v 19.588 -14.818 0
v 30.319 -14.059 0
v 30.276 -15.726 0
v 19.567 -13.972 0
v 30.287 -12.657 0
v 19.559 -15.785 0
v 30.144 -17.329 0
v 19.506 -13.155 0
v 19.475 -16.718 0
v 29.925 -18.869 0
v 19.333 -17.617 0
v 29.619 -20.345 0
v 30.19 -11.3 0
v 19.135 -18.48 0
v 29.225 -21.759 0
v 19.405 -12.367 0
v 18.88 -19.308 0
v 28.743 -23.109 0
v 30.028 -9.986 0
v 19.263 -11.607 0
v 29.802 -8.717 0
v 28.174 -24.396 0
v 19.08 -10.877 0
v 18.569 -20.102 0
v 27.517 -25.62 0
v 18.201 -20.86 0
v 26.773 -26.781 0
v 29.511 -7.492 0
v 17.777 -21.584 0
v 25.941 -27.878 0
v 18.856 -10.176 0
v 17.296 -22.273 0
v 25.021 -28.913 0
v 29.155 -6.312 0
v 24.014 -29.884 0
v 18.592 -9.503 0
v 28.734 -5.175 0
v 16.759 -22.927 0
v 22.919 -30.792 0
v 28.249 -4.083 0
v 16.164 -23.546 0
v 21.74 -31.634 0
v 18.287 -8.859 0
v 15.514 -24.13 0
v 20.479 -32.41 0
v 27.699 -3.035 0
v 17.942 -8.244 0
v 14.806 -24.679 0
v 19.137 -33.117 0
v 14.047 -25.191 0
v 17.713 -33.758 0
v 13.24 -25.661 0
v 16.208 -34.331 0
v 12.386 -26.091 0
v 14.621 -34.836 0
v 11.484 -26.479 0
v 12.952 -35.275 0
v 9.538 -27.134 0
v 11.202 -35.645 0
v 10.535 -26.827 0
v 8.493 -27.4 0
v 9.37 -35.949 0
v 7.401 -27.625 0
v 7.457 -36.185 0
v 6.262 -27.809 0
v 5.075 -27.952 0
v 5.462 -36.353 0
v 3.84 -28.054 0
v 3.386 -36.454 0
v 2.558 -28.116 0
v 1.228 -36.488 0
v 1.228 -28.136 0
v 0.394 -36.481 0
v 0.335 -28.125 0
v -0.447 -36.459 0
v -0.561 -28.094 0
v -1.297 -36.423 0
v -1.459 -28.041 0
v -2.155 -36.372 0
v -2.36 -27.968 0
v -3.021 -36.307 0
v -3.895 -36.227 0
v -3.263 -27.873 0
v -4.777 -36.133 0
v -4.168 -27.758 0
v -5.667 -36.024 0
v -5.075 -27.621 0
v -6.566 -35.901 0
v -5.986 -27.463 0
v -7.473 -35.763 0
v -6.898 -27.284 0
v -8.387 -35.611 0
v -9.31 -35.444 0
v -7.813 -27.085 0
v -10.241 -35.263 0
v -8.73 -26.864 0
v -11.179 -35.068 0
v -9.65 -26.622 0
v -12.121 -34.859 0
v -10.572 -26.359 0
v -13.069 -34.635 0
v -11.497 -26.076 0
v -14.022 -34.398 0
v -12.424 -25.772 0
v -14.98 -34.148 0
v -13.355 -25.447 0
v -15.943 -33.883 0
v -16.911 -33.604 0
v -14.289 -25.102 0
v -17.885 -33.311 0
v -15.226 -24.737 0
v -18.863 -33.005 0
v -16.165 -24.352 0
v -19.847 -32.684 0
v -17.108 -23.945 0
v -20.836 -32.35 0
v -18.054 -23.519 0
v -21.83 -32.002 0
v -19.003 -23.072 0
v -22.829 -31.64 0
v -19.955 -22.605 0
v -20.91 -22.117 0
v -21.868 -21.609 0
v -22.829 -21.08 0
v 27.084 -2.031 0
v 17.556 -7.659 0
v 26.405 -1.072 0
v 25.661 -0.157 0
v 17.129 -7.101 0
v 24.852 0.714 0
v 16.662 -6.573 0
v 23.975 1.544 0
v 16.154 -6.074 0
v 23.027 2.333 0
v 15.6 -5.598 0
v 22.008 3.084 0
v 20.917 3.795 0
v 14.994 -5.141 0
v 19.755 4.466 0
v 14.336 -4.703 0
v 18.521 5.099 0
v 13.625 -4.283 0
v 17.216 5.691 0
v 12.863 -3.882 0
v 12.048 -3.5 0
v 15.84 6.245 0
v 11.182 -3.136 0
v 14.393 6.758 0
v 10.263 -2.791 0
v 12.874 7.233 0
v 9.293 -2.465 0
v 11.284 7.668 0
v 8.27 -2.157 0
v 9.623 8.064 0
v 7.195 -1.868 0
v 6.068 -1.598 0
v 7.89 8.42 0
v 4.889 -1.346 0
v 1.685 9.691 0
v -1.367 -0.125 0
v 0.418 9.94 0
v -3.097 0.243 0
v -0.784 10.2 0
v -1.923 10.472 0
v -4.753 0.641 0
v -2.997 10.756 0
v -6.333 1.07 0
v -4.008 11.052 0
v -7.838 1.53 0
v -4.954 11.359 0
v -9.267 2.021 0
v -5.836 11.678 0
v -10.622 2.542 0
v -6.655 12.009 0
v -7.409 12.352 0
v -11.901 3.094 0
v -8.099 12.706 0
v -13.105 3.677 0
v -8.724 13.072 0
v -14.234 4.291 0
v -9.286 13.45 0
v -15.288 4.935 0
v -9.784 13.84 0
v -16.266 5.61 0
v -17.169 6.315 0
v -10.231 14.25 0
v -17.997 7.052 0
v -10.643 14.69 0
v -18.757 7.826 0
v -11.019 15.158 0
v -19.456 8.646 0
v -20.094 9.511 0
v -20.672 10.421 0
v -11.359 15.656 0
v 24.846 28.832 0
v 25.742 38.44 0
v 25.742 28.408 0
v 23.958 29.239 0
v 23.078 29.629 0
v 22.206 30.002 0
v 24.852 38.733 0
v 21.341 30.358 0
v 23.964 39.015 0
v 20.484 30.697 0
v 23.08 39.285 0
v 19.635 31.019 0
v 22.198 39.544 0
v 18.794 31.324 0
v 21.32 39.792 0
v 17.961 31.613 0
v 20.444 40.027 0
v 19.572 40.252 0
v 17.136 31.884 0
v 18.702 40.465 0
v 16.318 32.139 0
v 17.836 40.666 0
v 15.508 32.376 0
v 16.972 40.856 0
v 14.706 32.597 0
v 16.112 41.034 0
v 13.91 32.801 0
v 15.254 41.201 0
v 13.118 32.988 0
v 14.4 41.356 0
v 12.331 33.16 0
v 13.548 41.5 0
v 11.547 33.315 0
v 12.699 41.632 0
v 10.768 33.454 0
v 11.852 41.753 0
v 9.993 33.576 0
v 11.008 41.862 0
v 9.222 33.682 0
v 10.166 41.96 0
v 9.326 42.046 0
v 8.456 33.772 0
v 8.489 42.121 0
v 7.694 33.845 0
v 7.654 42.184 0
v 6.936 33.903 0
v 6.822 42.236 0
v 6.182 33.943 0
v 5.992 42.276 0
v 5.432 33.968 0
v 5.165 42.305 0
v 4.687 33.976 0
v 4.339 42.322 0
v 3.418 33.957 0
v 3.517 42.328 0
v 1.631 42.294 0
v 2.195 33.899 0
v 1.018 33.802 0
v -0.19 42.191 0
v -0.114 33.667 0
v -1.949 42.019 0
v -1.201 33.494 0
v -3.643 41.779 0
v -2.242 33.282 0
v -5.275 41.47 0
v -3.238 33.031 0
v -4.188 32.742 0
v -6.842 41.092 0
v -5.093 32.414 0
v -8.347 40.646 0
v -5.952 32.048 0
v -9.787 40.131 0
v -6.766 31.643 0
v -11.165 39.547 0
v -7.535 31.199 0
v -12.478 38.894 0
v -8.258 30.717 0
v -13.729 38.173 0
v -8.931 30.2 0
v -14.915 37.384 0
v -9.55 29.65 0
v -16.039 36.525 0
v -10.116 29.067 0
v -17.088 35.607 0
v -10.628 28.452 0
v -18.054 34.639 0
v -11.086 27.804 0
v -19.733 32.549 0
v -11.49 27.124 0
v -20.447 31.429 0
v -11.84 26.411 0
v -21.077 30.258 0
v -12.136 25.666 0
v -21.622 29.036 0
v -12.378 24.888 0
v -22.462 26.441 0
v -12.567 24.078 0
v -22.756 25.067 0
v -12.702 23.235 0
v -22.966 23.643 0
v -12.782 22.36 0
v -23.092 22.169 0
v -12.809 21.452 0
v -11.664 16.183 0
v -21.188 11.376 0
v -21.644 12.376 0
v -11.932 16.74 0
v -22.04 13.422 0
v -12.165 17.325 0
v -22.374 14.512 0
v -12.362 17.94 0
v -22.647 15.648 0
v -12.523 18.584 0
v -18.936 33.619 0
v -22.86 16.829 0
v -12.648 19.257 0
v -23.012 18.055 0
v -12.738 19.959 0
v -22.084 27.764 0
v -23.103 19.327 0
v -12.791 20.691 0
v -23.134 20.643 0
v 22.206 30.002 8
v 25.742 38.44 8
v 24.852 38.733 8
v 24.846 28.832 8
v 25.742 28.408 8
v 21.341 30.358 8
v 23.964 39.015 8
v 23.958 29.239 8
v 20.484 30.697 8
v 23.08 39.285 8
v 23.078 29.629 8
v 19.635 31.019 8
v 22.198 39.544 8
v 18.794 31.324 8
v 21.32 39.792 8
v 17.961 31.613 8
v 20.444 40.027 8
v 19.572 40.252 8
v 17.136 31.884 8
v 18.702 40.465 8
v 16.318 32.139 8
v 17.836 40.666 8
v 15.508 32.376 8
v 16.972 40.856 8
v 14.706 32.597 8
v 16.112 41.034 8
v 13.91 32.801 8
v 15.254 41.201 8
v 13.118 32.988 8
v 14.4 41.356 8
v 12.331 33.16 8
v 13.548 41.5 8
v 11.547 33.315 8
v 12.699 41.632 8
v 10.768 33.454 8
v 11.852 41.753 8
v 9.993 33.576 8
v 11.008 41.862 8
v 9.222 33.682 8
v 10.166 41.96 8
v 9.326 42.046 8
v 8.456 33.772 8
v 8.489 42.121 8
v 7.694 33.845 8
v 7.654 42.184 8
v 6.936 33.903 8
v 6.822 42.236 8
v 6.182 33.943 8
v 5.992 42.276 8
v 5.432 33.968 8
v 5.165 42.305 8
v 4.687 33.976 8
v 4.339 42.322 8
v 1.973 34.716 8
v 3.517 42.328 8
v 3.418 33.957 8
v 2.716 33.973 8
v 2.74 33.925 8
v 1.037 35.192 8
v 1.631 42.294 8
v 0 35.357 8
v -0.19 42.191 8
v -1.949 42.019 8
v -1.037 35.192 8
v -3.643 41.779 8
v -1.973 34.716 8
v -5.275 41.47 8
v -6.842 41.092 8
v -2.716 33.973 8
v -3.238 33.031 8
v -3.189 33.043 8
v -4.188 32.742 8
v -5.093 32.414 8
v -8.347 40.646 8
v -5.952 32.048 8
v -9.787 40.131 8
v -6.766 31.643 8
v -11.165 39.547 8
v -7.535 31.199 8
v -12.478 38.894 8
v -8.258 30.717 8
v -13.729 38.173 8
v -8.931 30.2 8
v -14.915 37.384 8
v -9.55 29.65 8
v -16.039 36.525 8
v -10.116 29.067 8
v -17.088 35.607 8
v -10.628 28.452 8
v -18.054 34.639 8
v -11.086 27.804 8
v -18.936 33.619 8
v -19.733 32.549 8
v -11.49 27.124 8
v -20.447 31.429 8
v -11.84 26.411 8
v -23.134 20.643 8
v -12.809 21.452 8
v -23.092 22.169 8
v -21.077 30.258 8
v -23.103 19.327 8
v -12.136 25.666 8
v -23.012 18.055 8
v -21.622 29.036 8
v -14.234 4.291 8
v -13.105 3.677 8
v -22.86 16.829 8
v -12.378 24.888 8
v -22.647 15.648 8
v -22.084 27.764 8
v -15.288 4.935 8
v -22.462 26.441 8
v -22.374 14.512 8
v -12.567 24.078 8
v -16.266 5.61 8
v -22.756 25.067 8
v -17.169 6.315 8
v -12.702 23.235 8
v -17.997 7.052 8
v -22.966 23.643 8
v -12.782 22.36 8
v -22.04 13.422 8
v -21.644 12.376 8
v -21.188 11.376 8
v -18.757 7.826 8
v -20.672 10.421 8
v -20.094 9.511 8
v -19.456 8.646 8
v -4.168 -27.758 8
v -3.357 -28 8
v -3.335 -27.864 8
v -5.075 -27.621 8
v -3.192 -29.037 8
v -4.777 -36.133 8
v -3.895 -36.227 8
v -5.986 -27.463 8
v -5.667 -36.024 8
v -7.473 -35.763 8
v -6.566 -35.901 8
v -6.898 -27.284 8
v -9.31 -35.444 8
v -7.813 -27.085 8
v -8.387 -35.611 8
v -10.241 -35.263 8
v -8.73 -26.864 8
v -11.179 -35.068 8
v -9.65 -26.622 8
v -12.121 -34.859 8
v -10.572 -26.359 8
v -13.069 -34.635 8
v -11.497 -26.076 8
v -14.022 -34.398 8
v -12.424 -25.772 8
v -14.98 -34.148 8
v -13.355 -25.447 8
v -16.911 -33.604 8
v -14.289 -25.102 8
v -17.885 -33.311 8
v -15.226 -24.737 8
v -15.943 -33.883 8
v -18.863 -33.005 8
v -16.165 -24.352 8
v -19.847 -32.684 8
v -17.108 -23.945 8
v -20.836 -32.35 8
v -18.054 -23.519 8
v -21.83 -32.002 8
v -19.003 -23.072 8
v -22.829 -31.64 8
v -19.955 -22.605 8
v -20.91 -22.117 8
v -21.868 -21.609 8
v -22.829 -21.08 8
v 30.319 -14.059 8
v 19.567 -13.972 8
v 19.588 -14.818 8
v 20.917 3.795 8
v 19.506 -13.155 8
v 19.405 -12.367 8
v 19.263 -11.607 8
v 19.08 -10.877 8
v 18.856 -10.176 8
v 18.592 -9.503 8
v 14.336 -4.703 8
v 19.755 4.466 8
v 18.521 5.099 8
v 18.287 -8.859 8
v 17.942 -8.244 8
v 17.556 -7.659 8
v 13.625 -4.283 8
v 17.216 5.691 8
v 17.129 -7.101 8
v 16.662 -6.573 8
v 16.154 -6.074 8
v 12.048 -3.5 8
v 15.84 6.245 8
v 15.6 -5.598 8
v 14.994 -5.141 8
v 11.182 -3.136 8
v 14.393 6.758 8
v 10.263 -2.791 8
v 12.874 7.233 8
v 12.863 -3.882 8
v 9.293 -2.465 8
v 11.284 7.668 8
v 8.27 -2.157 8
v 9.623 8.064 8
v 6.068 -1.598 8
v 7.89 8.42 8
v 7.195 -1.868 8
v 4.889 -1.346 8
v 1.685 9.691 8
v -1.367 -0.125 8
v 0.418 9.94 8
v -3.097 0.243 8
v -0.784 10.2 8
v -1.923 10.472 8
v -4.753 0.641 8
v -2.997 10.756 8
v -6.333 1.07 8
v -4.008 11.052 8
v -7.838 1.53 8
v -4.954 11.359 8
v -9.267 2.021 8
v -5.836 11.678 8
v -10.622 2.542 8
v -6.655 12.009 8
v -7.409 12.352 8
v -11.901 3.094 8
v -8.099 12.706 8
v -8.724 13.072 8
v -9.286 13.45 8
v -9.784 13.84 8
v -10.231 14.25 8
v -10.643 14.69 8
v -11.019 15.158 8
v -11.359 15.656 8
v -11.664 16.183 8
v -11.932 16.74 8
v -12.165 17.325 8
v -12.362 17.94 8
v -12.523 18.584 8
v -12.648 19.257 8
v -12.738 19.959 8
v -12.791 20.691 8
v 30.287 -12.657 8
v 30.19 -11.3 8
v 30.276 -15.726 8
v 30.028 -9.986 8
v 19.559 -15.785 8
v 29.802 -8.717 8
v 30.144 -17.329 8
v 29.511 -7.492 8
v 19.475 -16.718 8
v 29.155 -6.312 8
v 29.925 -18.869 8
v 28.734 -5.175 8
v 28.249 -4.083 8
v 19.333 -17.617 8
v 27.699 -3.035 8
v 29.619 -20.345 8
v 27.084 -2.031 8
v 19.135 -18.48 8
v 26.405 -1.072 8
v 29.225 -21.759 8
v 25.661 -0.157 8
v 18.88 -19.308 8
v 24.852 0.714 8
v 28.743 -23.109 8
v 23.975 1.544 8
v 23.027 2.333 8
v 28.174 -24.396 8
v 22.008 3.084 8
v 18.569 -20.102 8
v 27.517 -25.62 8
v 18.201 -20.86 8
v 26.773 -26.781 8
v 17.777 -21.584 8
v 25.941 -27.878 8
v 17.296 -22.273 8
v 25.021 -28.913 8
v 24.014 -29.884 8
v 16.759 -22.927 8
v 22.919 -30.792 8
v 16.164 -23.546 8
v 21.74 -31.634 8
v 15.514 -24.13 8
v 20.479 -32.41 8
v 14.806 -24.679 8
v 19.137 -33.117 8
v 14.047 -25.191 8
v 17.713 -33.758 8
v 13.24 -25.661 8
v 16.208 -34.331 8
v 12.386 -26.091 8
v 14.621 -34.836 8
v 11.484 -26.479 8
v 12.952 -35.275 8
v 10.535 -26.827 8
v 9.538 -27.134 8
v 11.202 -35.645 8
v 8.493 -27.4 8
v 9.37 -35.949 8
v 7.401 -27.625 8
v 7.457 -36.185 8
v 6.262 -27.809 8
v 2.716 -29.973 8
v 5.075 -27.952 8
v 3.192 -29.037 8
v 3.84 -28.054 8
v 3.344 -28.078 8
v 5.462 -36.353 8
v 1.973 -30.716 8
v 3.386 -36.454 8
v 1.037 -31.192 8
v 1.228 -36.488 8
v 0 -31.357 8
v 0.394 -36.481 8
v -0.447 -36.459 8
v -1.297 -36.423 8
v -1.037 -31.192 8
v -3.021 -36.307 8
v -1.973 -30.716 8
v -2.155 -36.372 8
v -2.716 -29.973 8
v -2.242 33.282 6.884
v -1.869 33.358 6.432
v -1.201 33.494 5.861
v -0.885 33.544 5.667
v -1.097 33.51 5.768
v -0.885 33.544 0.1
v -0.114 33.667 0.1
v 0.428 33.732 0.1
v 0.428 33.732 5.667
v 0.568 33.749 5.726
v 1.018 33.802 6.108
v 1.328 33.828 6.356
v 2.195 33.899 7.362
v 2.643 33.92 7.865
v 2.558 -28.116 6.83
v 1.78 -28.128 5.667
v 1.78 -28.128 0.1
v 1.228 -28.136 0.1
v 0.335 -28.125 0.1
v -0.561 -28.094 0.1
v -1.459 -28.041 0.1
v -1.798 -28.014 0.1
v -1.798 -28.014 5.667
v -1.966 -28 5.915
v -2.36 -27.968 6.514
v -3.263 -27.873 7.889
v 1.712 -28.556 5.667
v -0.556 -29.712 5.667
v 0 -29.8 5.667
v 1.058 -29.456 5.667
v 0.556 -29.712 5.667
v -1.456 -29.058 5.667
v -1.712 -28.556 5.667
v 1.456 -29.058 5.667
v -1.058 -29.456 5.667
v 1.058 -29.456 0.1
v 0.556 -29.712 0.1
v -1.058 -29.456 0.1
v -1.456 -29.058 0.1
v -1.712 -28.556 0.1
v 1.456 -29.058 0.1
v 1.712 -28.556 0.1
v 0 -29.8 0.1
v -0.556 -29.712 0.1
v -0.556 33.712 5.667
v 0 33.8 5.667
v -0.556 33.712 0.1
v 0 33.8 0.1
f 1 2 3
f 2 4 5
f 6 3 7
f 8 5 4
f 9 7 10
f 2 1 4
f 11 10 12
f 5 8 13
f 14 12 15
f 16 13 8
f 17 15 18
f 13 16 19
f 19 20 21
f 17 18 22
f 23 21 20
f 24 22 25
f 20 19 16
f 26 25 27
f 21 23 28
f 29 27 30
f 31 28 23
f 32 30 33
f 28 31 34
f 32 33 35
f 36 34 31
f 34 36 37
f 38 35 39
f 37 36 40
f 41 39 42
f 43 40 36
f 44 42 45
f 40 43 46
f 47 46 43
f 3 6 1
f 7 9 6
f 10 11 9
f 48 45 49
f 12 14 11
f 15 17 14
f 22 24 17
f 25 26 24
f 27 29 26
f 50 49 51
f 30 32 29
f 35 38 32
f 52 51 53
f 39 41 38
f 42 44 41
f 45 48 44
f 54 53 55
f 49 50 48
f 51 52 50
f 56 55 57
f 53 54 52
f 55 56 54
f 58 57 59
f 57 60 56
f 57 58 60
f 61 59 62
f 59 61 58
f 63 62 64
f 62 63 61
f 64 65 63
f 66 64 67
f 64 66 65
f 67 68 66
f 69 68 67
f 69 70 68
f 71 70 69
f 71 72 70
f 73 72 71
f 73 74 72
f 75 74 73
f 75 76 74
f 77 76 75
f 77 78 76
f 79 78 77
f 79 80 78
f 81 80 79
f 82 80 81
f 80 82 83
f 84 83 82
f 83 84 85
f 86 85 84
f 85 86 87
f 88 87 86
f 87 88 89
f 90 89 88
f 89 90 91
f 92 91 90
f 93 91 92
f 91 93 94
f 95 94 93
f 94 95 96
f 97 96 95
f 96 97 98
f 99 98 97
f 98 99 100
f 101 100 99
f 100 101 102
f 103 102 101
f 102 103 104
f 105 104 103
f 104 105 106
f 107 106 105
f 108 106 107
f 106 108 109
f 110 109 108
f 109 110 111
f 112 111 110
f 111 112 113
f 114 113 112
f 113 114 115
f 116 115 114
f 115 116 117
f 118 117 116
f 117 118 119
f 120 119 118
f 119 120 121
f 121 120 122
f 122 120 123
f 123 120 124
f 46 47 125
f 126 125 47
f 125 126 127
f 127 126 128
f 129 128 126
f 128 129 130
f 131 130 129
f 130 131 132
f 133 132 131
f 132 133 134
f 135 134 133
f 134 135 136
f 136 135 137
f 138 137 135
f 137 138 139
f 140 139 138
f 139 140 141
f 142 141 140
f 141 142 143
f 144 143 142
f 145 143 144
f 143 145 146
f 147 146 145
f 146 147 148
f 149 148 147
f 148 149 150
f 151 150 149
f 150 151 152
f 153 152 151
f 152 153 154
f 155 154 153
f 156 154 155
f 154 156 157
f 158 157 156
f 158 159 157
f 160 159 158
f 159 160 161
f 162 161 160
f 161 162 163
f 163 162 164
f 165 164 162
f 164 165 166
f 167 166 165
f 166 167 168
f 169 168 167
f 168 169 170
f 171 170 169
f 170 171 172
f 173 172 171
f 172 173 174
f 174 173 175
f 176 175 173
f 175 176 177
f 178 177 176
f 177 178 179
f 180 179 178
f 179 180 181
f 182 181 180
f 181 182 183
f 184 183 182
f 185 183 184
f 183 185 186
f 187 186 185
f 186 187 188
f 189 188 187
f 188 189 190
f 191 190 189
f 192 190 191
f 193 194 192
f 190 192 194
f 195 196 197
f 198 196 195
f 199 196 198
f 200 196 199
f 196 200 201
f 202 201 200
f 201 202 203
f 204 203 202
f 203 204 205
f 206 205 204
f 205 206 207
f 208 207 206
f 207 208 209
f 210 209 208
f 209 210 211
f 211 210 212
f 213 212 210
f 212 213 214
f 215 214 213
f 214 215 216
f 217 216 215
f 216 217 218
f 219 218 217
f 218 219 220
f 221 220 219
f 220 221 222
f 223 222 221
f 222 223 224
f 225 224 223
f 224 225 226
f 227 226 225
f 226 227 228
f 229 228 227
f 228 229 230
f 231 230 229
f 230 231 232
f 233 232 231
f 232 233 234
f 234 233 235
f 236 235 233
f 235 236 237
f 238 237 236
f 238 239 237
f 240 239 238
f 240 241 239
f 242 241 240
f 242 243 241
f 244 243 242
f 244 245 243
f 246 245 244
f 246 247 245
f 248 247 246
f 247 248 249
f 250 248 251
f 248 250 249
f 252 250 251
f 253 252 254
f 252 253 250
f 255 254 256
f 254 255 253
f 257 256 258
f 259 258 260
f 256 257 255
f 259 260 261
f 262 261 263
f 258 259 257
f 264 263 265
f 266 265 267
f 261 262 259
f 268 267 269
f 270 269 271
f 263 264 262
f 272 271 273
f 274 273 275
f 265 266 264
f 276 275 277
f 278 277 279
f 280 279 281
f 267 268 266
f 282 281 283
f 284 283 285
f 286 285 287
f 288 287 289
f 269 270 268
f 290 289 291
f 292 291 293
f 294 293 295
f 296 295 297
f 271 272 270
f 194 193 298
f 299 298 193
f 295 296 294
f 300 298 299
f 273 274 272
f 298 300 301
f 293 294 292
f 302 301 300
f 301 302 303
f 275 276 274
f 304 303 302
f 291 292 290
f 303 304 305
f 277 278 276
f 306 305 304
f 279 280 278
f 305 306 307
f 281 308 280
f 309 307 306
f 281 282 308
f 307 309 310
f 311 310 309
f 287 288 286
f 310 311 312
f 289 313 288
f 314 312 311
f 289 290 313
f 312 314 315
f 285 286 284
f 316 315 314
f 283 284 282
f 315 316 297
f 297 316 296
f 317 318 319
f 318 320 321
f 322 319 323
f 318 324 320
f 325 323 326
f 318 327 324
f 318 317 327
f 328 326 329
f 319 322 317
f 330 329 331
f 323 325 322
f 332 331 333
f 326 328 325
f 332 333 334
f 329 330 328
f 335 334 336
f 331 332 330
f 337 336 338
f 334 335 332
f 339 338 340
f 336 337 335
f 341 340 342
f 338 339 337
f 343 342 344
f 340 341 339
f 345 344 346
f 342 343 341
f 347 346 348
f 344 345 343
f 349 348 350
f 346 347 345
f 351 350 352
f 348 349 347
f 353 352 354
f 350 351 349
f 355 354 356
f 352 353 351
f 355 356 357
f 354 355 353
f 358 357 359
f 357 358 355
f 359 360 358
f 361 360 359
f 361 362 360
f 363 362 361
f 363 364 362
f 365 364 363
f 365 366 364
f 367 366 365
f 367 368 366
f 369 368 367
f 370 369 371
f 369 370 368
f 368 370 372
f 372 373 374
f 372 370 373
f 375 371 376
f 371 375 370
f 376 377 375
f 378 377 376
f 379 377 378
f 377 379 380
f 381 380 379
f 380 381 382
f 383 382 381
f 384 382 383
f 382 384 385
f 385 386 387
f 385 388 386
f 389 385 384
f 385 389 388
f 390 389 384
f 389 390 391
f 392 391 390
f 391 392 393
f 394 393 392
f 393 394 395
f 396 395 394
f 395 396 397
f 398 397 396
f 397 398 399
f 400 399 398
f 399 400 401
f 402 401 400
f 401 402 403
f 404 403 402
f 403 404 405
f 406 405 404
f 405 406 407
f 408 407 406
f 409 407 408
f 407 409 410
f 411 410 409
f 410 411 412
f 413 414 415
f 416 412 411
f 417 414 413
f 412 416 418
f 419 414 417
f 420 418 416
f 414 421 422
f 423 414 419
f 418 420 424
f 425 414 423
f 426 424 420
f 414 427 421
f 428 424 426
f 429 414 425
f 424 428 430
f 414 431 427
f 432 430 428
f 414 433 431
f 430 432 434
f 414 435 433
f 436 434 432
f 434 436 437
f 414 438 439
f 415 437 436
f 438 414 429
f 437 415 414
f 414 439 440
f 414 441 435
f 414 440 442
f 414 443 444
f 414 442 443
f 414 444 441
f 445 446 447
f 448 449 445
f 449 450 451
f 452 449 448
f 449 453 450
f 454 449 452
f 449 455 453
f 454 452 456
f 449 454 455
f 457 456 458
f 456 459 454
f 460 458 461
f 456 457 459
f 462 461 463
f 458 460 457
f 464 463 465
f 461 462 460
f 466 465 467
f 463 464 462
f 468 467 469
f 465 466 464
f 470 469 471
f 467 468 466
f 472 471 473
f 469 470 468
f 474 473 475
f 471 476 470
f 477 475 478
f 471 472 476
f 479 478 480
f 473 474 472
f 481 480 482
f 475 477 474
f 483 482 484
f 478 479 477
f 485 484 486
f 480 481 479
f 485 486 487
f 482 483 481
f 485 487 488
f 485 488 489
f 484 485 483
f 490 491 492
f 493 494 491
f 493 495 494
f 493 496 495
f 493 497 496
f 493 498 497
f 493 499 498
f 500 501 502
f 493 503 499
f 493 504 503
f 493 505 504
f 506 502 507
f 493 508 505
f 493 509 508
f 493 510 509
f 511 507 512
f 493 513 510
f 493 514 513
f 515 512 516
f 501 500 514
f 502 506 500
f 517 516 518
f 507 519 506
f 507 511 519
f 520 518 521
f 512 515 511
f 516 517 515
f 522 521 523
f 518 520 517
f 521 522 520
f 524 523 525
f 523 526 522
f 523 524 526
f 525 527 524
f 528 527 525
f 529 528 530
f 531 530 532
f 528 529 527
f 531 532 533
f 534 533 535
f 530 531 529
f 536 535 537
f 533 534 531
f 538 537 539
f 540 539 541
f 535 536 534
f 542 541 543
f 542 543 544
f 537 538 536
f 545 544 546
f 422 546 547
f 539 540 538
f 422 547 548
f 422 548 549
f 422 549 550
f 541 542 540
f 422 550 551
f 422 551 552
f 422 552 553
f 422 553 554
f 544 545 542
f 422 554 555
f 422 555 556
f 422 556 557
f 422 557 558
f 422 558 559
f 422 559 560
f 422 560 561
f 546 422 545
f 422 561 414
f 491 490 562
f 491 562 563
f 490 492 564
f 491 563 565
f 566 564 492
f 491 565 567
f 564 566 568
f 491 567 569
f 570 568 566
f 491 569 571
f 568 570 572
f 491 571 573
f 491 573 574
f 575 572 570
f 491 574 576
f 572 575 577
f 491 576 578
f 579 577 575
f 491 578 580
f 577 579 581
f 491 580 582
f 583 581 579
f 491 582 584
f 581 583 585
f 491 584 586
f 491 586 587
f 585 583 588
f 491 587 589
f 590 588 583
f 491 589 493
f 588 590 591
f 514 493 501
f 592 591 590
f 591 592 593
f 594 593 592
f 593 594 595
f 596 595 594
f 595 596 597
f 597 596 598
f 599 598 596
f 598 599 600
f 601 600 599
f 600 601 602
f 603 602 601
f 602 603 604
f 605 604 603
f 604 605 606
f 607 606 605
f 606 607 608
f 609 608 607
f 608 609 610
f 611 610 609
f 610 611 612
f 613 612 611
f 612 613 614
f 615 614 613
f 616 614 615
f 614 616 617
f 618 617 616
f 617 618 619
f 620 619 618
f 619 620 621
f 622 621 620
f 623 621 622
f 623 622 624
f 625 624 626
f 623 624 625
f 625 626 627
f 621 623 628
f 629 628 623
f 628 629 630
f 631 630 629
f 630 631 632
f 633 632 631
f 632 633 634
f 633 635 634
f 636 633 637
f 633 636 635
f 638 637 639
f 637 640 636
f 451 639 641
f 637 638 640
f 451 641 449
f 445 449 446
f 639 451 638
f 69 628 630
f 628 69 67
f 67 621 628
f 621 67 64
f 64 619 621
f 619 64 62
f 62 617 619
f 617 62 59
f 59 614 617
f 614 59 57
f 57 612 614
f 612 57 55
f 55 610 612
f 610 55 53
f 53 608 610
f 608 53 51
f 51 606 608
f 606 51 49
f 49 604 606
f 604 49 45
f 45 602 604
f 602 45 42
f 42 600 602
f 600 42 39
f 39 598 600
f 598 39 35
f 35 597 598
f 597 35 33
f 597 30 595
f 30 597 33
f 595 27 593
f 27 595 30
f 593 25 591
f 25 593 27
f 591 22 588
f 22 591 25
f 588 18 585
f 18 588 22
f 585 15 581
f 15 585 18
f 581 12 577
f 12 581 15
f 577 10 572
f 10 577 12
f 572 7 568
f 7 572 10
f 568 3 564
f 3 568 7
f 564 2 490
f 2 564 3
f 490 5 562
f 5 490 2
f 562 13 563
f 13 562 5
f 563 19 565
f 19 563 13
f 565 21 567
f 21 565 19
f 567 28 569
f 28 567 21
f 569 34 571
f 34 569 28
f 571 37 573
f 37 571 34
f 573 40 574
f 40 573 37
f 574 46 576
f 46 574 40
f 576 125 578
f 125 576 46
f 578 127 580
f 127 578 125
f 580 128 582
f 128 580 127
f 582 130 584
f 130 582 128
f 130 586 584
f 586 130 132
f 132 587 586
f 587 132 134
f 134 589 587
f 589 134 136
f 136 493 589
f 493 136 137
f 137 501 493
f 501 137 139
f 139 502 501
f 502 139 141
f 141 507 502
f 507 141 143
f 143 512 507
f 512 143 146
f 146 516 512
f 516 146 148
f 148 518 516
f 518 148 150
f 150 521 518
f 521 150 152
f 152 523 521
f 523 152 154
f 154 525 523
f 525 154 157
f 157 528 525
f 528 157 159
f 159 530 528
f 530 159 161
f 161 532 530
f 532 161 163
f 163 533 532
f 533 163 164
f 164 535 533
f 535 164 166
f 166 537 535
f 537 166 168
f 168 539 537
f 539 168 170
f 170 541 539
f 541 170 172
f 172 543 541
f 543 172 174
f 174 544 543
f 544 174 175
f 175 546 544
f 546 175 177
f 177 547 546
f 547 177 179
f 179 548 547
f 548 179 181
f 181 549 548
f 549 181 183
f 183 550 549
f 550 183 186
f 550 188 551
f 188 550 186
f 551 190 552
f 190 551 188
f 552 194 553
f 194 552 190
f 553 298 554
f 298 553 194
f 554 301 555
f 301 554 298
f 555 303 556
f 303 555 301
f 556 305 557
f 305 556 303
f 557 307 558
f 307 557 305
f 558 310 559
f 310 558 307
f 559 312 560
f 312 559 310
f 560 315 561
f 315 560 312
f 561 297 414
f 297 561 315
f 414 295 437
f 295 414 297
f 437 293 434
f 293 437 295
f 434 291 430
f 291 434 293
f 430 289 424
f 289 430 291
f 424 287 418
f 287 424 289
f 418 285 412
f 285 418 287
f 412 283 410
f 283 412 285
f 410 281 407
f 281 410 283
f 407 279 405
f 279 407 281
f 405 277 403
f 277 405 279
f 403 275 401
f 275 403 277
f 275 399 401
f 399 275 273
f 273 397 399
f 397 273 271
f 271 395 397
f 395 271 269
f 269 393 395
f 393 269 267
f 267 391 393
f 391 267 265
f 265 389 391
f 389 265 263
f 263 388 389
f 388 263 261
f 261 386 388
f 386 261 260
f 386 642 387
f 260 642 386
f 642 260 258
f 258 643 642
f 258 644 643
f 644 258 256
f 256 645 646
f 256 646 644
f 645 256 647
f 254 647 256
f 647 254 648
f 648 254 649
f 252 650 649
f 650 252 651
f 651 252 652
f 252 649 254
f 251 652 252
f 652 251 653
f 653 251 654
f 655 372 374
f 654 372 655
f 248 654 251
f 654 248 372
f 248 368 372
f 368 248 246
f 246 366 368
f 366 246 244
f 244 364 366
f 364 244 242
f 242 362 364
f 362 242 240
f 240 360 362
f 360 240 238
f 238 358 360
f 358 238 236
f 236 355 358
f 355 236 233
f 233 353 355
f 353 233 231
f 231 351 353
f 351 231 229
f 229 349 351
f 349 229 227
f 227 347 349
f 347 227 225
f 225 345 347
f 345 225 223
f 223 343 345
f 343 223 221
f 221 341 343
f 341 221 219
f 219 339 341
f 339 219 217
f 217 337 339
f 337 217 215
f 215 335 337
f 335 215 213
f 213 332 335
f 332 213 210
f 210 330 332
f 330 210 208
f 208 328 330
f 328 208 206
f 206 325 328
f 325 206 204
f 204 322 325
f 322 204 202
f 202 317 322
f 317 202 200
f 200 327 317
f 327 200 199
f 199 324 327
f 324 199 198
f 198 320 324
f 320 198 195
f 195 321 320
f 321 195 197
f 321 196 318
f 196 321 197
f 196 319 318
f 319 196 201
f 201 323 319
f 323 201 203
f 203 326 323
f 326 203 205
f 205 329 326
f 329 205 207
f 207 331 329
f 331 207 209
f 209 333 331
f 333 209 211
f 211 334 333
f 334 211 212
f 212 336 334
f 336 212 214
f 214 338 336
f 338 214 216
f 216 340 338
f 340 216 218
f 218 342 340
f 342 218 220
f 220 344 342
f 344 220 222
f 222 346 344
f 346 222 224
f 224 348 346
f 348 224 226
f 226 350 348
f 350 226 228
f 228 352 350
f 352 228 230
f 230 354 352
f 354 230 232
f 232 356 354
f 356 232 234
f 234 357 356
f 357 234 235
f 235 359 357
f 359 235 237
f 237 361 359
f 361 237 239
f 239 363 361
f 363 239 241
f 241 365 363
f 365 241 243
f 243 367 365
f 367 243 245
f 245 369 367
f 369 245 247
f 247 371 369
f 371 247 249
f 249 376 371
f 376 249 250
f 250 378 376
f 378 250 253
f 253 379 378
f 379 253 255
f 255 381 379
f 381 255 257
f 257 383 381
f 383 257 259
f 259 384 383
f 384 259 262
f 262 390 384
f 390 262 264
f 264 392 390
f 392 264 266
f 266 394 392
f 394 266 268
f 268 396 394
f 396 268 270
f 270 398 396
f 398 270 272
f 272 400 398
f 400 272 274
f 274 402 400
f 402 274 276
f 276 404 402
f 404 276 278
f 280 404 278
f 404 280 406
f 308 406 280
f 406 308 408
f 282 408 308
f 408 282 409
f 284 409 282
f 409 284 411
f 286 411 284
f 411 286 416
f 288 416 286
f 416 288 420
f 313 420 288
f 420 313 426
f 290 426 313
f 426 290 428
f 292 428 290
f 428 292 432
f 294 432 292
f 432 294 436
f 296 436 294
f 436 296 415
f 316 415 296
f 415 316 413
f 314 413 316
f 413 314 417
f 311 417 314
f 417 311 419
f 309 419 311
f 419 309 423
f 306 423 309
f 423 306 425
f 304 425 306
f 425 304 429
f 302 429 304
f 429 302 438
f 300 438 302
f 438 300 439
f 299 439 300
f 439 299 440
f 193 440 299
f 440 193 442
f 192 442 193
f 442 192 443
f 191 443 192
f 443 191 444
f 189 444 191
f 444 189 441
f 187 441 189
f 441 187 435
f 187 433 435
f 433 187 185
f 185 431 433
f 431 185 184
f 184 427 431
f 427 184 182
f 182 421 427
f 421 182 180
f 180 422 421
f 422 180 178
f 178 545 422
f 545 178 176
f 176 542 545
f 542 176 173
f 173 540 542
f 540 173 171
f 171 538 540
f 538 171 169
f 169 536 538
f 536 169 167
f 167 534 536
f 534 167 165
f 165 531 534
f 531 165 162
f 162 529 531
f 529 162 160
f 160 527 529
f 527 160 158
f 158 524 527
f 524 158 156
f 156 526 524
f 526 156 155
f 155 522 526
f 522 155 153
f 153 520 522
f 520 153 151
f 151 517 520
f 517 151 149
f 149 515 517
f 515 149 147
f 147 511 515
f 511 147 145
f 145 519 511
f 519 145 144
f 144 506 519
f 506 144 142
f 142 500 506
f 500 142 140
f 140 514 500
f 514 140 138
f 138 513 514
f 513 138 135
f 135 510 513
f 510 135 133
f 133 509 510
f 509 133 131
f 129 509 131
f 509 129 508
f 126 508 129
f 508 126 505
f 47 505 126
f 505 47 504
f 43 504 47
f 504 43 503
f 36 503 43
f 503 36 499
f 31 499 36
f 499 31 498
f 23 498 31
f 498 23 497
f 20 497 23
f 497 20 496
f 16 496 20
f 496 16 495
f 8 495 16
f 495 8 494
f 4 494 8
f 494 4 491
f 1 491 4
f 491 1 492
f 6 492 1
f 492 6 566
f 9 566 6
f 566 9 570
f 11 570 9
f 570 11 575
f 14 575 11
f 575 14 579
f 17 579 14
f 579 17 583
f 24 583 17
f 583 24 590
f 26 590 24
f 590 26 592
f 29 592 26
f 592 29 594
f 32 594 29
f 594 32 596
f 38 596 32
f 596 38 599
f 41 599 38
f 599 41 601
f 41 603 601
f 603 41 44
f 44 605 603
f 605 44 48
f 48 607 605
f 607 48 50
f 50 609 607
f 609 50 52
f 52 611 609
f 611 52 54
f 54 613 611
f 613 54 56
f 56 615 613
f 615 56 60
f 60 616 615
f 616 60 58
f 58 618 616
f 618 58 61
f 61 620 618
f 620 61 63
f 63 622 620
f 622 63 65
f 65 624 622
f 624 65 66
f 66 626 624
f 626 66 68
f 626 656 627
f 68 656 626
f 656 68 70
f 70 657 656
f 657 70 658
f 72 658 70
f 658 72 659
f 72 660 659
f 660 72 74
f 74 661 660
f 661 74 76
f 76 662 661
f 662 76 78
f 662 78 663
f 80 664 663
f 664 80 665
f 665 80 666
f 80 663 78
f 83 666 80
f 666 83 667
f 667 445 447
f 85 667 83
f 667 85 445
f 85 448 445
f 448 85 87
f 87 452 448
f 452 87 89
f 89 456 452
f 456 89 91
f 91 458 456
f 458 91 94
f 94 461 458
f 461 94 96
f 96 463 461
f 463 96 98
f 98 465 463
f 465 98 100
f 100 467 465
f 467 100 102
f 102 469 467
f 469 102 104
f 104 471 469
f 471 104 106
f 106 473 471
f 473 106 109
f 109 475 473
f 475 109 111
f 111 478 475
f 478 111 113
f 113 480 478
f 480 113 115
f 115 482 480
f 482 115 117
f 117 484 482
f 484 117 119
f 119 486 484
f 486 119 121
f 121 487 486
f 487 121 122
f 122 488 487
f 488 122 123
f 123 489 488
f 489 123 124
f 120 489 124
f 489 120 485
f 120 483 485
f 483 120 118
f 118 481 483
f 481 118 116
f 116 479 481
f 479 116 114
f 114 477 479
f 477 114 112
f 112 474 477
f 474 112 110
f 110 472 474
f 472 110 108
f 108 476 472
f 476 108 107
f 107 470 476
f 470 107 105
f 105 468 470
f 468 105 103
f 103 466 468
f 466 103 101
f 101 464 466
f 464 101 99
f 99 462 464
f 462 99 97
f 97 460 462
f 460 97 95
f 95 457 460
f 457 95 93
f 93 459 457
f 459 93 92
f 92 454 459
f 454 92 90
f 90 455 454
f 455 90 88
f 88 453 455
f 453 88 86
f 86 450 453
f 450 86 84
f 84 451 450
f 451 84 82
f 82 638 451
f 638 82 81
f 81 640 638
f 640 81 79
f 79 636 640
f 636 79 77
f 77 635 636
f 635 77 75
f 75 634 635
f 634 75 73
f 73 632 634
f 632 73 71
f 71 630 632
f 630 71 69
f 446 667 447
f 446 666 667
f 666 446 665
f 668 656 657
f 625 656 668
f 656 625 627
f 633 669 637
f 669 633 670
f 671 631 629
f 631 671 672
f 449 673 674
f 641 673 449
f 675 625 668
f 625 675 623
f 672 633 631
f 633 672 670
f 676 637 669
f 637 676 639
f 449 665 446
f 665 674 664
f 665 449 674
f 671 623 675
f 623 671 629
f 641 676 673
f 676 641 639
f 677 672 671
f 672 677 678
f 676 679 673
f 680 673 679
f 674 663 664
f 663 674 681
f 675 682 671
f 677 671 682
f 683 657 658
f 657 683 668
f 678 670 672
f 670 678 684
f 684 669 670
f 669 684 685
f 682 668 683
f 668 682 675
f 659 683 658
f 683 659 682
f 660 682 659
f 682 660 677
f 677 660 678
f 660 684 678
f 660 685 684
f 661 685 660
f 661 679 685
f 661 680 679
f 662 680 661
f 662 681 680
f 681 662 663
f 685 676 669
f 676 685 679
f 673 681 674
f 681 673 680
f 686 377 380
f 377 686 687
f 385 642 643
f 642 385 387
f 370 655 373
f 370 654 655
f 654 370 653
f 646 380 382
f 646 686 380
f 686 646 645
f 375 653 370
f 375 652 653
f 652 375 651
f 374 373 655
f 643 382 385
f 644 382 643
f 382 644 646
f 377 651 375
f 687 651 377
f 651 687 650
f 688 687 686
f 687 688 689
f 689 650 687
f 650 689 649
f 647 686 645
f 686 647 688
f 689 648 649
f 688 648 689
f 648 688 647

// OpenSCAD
// Street Numbers for 3D printing
// Charles Tilford, 2019
// License: CC BY-NC-SA 4.0
//   https://creativecommons.org/licenses/by-nc-sa/4.0/

char="S";     // The number/letter to print

// Units are in mm, except for height of letter

// How many inches high should letter be?
inchesHigh=3;
// How thick/deep should letter be (mm)?
depth=8;

// Character coordinates just center the letter
charX=-30;    // Character X coord
charY=-35;    // Character Y coord
topScrew=32;  // Top screw Y coord
botScrew=-28; // Bottom screw Y coord
height=8;     // Thickness of character
// Screw dimensions. Default presumes
// #6 sheet metal screw
screwWid=3.6; // Width of screw shaft
screwTop=6.78;// Width of screw head
screwCon=5.08;// Height of head 'cone'

// Font to print in. Your system needs this
// installed, of course. If changed the hole
// positions almost certainly need to be
// changed, and maybe charX/charY.
fName="Open Sans Extrabold";
// https://fonts.google.com/specimen/Open+Sans
// Designer: Steve Matteson

// Thin floor below holes. My printer was
// struggling to have the hole 'border' stick
// to the stage. Just drill/screw thru it.
holeFloor=0.1; 

// ==========================================
// ===== All values below are auto-calculated
// ==========================================

// Scaled values
scaleFactor=inchesHigh / 3;
cX=charX * scaleFactor;
cY=charY * scaleFactor;
tS=topScrew * scaleFactor;
bS=botScrew * scaleFactor;
// Where do we start drawing screw head cone?
oS=depth - (screwCon-.05);

difference() {
  // We use difference() to punch out the screw holes
  // in the character
    
  // The character itself, 8mm thick
  translate([cX,cY,0])
    linear_extrude(height=depth, scale=1)
    text(char, size=(75*scaleFactor),
         $fn=100, font=fName);
    
  // Bottom screw hole
  translate([0,bS,oS]) color("red")
    cylinder(h=screwCon, d2=screwTop,
             d1=0, $fn=20);
   translate([0,bS,holeFloor])
    cylinder(h=20, d=screwWid, $fn=20);
    
  // Top screw hole
  translate([0,tS,oS]) color("red")
    cylinder(h=screwCon, d2=screwTop,
             d1=0, $fn=20);
  translate([0,tS,holeFloor])
    cylinder(h=20, d=screwWid, $fn=20);
}

// Colors are just to aid visualization of
// void spaces. $fn is "featuer number", ie how
// many polygons are devoted to object. The values
// above should be near your printing limit anyway.

// Developed in OpenSCAD
//    https://www.openscad.org/
